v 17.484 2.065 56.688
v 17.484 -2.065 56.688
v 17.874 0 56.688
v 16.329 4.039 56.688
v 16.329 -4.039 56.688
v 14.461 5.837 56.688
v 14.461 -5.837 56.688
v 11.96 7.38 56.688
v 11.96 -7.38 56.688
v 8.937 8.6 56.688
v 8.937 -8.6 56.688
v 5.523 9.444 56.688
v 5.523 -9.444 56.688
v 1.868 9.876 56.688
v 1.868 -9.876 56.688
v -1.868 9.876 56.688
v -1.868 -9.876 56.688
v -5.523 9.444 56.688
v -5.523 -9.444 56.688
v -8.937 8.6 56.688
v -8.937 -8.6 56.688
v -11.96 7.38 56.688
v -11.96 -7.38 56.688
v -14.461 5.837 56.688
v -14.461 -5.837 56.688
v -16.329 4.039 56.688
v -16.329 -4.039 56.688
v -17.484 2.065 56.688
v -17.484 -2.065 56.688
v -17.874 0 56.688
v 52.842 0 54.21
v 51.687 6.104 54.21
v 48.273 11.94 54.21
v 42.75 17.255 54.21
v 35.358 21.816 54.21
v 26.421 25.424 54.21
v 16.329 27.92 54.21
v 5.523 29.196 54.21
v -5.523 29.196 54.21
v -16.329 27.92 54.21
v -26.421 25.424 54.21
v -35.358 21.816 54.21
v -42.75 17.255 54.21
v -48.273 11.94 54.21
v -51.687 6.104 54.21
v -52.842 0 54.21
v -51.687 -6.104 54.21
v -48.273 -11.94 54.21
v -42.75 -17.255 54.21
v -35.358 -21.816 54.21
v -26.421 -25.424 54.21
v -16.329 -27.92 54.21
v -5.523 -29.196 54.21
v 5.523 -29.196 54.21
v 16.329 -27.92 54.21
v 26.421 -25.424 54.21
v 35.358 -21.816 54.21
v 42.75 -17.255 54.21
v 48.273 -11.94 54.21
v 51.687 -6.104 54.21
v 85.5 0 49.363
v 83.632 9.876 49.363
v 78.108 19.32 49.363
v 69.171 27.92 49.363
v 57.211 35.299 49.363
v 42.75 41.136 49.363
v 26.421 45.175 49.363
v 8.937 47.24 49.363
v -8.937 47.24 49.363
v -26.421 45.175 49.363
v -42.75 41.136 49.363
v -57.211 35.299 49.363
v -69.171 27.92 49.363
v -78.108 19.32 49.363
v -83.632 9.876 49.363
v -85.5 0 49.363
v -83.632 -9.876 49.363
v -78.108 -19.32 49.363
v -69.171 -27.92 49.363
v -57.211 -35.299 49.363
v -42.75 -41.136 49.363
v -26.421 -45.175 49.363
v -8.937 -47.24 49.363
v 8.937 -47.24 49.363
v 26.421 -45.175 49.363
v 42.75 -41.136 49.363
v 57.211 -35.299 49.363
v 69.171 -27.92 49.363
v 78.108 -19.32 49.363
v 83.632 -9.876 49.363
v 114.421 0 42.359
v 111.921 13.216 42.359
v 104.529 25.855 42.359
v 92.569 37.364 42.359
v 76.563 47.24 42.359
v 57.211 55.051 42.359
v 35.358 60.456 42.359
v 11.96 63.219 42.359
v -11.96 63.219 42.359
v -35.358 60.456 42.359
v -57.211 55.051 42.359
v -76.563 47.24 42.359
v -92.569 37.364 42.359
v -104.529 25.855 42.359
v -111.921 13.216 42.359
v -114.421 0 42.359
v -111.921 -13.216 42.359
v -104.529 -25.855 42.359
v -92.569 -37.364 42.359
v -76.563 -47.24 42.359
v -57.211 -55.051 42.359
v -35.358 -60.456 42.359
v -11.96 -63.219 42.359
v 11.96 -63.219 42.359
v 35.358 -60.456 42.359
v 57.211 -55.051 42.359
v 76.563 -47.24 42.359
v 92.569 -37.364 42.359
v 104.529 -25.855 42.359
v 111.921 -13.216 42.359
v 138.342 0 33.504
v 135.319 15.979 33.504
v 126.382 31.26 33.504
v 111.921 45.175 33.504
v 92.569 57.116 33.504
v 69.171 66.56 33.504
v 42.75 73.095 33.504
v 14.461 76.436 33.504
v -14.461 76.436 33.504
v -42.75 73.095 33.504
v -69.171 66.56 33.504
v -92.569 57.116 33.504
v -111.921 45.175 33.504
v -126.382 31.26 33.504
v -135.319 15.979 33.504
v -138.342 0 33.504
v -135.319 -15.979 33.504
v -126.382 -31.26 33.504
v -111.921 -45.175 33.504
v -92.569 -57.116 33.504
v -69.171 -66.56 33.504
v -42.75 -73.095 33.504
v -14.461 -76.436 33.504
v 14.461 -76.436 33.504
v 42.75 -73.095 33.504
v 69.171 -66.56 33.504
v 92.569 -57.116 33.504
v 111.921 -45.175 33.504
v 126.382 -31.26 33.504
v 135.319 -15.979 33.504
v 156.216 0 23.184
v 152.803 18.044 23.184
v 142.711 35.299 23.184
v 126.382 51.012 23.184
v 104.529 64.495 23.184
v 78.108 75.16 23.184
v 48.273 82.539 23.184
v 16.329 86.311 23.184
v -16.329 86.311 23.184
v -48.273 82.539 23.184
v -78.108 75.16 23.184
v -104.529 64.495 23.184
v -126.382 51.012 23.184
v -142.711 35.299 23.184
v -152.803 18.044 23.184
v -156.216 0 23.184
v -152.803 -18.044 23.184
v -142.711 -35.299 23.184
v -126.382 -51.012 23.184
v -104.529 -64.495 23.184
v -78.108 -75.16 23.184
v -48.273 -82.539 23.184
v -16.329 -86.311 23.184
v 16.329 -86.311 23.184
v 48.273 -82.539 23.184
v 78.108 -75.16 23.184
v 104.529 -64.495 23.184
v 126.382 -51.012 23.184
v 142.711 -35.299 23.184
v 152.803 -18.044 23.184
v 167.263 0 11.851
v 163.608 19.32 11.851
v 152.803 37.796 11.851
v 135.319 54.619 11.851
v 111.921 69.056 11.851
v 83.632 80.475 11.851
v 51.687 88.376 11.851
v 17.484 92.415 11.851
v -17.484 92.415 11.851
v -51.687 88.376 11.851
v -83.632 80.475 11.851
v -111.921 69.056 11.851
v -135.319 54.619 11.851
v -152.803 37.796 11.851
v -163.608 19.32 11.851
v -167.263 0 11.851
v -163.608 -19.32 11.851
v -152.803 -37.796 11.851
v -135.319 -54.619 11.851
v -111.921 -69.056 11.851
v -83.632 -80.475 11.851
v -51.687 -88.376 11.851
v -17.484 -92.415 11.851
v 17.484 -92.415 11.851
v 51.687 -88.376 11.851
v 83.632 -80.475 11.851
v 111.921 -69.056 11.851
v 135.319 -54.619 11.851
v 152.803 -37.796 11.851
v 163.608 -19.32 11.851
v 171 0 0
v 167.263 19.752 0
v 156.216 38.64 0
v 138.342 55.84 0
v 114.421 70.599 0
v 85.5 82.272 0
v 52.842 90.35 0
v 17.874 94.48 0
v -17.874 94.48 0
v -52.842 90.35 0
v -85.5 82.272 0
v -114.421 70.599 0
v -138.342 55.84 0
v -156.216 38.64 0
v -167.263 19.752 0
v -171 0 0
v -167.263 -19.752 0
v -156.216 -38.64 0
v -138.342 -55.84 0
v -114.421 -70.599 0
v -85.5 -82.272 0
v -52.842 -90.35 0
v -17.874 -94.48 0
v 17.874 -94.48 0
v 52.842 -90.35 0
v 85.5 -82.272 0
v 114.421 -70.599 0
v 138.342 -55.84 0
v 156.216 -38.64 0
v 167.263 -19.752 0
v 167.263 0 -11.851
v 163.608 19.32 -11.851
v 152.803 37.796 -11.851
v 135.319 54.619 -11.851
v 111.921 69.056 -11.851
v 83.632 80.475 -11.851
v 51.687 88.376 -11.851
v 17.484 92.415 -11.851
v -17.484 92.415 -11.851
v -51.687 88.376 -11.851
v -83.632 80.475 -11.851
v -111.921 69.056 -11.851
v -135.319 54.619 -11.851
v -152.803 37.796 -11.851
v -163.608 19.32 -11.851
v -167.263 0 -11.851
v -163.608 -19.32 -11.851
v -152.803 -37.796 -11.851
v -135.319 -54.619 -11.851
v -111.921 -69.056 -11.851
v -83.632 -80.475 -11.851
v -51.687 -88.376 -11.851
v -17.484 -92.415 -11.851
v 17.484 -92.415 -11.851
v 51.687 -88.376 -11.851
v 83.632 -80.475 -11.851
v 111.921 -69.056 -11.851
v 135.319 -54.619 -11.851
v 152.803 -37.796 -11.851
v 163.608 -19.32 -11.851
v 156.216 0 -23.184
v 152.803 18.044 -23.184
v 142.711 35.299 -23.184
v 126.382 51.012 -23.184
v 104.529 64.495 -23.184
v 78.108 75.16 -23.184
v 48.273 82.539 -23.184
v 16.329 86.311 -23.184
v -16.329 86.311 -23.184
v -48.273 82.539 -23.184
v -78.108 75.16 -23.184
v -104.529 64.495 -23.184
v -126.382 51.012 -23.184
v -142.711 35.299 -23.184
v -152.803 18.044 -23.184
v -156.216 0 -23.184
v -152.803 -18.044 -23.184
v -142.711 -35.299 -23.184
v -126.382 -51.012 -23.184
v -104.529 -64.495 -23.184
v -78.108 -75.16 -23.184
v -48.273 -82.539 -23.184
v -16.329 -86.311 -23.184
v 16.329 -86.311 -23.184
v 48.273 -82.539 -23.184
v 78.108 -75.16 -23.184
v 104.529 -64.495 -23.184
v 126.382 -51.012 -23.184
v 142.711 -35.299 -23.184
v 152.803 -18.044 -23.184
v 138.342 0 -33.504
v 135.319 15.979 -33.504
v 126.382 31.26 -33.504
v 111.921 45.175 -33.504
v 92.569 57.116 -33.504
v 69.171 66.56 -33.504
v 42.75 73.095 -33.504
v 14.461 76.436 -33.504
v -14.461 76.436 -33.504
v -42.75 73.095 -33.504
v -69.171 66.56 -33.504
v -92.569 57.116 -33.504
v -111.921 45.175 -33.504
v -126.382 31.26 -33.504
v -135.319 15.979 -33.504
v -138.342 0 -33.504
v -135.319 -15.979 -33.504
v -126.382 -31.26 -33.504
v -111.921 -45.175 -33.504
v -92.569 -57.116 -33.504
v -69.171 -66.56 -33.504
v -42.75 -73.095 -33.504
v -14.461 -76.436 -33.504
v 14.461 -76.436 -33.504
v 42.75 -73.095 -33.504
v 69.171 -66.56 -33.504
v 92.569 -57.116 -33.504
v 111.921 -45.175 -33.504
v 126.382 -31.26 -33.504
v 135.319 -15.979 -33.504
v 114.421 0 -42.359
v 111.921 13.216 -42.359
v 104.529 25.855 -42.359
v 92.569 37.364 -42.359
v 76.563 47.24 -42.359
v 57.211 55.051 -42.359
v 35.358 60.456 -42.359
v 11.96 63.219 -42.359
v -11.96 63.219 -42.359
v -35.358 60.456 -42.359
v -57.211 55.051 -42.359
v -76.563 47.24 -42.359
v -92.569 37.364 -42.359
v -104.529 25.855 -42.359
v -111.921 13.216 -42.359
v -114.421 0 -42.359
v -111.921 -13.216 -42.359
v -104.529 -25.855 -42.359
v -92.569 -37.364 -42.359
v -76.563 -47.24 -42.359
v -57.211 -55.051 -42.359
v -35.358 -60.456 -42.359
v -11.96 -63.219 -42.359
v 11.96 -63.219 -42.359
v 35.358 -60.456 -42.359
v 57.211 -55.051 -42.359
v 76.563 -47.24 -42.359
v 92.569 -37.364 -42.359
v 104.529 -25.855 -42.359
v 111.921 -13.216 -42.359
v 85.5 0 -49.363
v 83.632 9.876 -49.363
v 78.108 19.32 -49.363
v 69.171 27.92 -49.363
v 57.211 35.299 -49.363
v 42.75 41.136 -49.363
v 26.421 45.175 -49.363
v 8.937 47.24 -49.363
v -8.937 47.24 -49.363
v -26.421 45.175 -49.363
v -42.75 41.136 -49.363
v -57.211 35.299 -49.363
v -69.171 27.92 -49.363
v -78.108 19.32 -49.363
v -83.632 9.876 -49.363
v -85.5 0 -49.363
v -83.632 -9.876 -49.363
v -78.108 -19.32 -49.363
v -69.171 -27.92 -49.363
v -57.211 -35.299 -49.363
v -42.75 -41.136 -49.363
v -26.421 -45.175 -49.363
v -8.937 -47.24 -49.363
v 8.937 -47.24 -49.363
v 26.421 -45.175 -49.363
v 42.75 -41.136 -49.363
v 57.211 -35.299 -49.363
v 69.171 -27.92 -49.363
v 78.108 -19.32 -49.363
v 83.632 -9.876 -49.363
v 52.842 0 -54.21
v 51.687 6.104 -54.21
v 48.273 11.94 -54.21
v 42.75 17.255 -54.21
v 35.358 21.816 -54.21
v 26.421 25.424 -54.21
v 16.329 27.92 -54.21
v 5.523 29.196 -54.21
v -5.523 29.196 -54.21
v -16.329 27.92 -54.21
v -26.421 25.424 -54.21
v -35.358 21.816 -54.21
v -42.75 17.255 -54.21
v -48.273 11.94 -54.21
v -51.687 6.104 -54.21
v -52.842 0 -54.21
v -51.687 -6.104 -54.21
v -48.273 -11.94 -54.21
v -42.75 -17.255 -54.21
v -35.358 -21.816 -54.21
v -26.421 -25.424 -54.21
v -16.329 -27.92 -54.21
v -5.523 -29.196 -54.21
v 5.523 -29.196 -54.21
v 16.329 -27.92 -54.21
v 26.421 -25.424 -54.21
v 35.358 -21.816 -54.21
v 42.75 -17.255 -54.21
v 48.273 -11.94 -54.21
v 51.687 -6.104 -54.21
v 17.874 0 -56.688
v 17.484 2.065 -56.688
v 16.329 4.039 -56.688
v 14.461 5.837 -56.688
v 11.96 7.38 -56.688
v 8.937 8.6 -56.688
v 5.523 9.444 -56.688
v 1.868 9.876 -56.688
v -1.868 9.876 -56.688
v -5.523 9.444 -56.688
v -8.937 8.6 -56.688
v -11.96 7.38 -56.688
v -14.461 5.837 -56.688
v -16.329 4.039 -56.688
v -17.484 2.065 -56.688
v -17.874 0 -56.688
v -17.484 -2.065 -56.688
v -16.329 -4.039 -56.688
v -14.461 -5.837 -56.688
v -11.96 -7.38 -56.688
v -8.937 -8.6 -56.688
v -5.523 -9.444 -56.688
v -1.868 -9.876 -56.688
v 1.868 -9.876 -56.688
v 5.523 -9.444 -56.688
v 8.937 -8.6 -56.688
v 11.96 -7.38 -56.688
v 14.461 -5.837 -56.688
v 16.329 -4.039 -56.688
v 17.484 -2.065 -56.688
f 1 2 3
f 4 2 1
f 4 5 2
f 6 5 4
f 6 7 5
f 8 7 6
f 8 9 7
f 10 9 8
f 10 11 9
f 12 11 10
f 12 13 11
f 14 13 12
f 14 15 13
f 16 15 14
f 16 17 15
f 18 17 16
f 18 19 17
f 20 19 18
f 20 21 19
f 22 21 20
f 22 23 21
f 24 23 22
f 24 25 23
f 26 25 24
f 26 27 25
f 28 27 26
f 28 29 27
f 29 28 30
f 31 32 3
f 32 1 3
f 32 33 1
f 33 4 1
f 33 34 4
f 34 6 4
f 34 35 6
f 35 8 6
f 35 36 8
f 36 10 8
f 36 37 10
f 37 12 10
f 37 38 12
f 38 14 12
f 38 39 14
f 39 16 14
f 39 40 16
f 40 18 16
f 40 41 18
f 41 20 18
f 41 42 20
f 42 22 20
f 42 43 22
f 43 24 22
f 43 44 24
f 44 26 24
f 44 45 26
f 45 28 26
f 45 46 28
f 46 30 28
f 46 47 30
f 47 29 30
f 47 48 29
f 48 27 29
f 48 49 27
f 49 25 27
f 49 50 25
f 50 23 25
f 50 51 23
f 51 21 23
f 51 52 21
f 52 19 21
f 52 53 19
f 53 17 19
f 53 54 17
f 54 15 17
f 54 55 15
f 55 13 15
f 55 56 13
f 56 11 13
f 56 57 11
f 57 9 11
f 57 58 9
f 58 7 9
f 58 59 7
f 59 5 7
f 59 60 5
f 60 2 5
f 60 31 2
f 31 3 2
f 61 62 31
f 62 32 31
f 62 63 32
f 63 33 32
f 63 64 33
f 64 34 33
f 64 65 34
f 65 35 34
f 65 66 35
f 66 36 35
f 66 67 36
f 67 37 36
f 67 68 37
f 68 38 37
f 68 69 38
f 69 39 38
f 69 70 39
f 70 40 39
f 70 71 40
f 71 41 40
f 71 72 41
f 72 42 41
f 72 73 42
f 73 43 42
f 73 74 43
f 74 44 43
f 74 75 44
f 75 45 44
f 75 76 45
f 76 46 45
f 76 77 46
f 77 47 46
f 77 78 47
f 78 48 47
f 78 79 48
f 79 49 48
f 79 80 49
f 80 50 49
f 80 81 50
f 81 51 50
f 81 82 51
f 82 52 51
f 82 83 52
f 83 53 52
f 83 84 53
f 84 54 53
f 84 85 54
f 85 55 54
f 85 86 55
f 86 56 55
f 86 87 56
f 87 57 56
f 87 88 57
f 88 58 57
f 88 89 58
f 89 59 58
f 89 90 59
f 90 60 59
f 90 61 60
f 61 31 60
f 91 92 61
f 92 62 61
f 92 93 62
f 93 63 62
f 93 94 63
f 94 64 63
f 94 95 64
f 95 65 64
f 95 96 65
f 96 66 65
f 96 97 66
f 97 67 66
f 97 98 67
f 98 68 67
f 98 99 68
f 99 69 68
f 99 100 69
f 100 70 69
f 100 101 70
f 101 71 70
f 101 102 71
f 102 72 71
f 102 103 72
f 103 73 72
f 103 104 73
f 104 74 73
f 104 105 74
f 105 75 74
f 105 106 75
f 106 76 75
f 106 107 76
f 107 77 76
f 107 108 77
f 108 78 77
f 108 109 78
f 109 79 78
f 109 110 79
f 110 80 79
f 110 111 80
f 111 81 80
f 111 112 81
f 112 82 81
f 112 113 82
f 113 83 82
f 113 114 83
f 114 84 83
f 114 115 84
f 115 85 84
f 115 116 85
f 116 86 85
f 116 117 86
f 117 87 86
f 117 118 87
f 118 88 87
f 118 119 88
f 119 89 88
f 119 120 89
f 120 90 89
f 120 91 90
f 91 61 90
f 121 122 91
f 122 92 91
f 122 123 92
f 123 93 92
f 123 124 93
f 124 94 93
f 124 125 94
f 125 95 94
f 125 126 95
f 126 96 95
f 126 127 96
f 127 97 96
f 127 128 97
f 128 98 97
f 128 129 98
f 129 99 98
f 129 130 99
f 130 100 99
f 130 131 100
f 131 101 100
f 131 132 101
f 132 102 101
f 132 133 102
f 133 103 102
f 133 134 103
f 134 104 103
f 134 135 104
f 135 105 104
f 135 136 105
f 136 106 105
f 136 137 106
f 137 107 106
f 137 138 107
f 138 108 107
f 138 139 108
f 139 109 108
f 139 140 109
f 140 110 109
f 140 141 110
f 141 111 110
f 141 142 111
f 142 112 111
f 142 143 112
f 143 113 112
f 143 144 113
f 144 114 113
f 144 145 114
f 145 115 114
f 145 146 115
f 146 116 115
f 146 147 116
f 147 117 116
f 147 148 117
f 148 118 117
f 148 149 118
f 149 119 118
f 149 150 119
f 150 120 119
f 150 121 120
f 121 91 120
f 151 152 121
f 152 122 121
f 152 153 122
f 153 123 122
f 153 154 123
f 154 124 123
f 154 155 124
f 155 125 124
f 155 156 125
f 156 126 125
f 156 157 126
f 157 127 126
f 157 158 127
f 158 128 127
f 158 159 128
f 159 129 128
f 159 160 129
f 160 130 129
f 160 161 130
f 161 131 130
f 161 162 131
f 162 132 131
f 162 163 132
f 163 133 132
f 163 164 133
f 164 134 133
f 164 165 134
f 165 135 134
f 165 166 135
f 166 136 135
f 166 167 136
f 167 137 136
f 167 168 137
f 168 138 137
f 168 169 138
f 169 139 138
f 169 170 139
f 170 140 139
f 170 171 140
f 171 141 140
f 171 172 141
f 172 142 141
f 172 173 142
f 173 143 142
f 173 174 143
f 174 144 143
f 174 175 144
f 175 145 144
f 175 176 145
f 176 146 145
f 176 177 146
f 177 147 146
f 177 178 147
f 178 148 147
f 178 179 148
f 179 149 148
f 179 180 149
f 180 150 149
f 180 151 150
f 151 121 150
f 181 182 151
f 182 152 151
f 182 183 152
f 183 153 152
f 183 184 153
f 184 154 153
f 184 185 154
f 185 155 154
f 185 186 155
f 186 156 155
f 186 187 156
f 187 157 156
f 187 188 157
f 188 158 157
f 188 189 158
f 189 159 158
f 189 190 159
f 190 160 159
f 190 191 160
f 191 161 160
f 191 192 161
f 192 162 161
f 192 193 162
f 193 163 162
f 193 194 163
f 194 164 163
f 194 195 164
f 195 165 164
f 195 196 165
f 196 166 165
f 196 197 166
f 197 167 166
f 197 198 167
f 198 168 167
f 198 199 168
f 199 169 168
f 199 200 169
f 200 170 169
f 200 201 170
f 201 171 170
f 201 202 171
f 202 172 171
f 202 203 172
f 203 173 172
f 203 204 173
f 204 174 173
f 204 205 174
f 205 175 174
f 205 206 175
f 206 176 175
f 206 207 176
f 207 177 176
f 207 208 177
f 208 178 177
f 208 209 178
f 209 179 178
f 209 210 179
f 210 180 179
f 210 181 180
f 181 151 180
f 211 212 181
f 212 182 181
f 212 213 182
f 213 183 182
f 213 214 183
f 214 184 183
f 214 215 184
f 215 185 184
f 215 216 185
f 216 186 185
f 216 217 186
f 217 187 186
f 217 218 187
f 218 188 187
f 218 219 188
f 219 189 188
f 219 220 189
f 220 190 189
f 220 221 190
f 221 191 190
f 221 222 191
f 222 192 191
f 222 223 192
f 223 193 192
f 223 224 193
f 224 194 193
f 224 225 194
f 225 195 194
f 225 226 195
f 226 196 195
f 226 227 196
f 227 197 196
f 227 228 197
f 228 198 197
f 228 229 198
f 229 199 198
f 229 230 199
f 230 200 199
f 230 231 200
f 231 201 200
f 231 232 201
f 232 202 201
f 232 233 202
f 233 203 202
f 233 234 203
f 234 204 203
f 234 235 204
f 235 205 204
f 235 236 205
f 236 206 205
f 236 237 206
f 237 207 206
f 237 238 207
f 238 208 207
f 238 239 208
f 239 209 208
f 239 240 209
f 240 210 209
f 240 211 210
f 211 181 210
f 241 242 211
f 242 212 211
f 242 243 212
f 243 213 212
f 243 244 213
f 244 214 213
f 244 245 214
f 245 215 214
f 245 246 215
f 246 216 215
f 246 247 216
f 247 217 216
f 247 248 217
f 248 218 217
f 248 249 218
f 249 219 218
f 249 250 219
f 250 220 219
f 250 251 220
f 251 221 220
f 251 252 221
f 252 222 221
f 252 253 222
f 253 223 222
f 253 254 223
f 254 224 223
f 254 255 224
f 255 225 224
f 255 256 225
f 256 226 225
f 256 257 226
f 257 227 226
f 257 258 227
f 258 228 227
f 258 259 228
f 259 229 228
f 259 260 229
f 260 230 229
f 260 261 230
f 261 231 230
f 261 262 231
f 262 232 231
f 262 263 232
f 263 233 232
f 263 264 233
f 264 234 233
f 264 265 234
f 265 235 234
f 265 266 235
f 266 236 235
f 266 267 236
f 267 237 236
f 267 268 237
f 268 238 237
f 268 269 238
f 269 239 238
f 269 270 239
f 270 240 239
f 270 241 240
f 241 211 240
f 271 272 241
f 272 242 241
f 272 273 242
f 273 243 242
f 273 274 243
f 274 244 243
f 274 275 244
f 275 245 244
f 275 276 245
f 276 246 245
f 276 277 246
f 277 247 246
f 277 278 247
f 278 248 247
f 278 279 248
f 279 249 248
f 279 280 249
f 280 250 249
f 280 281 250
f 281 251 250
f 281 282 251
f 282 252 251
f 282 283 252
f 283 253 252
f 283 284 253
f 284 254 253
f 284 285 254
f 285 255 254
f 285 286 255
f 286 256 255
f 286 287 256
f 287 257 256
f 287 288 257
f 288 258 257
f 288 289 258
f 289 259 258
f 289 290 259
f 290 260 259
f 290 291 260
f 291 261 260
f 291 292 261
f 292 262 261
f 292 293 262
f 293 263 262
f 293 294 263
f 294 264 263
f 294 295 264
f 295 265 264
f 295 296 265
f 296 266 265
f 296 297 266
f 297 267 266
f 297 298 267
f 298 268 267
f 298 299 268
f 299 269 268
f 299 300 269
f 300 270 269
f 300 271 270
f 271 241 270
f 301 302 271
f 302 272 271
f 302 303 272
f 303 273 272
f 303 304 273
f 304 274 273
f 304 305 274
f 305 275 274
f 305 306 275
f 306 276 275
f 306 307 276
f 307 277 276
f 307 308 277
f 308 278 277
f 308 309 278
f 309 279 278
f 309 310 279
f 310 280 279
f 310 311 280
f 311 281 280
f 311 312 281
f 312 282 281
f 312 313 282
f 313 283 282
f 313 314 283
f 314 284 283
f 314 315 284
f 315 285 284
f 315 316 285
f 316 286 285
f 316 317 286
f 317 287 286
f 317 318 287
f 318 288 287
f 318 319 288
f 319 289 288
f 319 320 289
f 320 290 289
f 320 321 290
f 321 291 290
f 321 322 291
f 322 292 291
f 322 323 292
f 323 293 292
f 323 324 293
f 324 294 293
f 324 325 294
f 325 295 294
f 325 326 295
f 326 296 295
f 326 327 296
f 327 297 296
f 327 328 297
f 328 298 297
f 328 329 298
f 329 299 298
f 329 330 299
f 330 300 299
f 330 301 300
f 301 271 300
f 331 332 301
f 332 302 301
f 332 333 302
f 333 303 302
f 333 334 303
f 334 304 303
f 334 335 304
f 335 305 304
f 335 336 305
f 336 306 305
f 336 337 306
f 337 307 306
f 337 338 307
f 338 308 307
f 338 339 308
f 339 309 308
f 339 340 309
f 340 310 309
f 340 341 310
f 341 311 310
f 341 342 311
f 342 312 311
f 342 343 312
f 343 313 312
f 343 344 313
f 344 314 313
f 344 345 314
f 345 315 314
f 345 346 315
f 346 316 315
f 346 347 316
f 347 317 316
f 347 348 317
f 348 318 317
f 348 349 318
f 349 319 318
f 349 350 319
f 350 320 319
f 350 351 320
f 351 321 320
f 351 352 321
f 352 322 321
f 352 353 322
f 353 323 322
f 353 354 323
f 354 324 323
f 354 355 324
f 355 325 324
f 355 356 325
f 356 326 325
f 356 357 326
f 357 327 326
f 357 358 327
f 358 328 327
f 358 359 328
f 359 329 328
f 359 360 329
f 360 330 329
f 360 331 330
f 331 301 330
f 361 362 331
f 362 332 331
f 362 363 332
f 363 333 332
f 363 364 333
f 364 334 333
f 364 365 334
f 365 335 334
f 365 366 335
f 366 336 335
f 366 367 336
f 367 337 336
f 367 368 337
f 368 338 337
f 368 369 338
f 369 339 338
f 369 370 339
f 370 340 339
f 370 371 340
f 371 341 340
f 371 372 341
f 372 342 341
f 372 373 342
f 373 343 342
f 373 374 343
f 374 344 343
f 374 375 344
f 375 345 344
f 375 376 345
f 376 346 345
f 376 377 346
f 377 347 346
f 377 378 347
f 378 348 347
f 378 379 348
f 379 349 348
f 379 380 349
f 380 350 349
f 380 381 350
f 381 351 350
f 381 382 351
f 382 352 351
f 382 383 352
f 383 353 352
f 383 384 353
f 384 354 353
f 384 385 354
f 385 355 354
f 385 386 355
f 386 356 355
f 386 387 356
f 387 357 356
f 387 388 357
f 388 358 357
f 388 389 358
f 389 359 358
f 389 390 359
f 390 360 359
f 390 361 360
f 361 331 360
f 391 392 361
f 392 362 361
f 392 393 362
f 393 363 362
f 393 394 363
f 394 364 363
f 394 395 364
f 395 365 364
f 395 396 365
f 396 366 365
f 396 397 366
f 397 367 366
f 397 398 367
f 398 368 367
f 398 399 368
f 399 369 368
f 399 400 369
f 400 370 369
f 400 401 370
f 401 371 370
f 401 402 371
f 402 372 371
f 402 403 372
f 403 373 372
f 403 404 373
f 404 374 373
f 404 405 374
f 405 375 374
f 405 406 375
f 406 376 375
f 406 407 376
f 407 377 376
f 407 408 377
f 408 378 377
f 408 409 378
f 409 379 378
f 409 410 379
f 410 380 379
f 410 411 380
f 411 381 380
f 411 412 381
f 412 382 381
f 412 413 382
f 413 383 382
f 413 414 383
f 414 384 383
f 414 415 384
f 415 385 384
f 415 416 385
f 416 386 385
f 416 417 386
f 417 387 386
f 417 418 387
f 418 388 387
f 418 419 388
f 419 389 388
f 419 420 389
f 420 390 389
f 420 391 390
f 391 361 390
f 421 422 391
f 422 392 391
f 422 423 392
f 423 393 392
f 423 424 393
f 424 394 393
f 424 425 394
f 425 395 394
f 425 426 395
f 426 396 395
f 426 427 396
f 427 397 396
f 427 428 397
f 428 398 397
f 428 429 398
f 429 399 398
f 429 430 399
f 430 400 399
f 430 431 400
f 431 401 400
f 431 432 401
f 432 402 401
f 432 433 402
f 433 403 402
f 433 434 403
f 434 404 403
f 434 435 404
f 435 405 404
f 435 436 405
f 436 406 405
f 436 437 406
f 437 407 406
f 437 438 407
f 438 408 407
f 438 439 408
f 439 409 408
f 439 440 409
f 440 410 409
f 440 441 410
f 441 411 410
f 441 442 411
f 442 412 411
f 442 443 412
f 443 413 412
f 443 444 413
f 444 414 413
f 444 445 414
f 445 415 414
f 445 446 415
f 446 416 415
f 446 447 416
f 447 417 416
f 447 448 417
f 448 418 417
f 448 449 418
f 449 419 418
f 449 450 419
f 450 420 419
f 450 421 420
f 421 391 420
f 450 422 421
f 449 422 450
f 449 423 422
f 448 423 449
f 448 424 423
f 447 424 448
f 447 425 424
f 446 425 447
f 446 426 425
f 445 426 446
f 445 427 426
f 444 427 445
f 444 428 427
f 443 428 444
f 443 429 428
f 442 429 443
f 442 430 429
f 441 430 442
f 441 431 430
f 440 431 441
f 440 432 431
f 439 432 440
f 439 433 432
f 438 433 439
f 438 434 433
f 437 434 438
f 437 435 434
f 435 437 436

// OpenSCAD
// Generated by SolidPython 1.0.1 on 2020-07-29 00:46:48


scale(v = [9, 5, 3]) {
	sphere(r = 19);
}
/***********************************************
*********      SolidPython code:      **********
************************************************
 
# import packages: SolidPython
from solid import *
from solid.utils import *
from itertools import chain, combinations, permutations


class Resize:

    def __init__(self, scad_file):
        self.scad_file = scad_file
        #self.scad_file = import_scad(scad_file)
        # cone/cylinder param:
        self.r1 = 0
        self.r2 = 0
        self.h = 0
        # rectangular prism param:
        self.w = 0
        self.l = 0
        # ellipse param:
        self.r = 0

    # import OpenScad code (file name corresponds to shape)


    # classify shape + parameters
    def assign(self, param1, param2, param3):
        if self.scad_file == 'cone.scad':
            self.r1 = param1
            self.r2 = param2
            self.h = param3
        elif self.scad_file == 'cylinder.scad':
            self.r1 = param1
            self.r2 = param2
            self.h = param3
        elif self.scad_file == 'rectangularPrism.scad':
            self.h = param1
            self.l = param2
            self.w = param3
        else:
            self.r = param1
            self.h = param2

    # resize parameters
    def iterate(self):
        x = range(3, 20, 2)
        i = 1
        if self.scad_file == 'cone.scad':
            tempList = list(permutations(x, 2))
            for temp in tempList:
                param1 = temp[0]
                param2 = temp[1]
                filepath = 'produced_scad_files/' + 'cone' + str(param1) + '_' + str(param2) + '_' + '.scad'
                scad_render_to_file(cylinder(h=param1, r1=param2, r2=0), filepath)

        elif self.scad_file == 'cylinder.scad':
            tempList = list(permutations(x, 3))
            for temp in tempList:
                param1 = temp[0]
                param2 = temp[1]
                filepath = 'produced_scad_files/' + 'cylinder' + str(param1) + '_' + str(param2) + '_' + '.scad'
                scad_render_to_file(cylinder(h=param1, r1=param2, r2=param2), filepath)

        elif self.scad_file == 'rectangularPrism.scad':
            tempList = list(permutations(x, 3))
            for temp in tempList:
                param1 = temp[0]
                param2 = temp[1]
                param3 = temp[2]
                filepath = 'produced_scad_files/' + 'rectangularPrism' + str(param1) + '_' + str(param2) + '_' + str(
                    param3) + '.scad'
                scad_render_to_file(cube(size=(param1, param2, param3)), filepath)

        elif self.scad_file == 'ellipse.scad':
            tempList = list(permutations(x, 4))
            for temp in tempList:
                param1 = temp[0]
                param2 = temp[1]
                param3 = temp[2]
                param4 = temp[3]
                filepath = 'produced_scad_files/' + 'ellipse' + str(param1) + '_' + str(param2) + '_' + str(param3) + '_' + str(param4) + '.scad'
                scad_render_to_file(scale([param1, param2, param3])(sphere(r=param4)), filepath)

    def render_to_scadfile(self):
        scad_render_to_file(scad, 'example.scad') 
 
************************************************/
